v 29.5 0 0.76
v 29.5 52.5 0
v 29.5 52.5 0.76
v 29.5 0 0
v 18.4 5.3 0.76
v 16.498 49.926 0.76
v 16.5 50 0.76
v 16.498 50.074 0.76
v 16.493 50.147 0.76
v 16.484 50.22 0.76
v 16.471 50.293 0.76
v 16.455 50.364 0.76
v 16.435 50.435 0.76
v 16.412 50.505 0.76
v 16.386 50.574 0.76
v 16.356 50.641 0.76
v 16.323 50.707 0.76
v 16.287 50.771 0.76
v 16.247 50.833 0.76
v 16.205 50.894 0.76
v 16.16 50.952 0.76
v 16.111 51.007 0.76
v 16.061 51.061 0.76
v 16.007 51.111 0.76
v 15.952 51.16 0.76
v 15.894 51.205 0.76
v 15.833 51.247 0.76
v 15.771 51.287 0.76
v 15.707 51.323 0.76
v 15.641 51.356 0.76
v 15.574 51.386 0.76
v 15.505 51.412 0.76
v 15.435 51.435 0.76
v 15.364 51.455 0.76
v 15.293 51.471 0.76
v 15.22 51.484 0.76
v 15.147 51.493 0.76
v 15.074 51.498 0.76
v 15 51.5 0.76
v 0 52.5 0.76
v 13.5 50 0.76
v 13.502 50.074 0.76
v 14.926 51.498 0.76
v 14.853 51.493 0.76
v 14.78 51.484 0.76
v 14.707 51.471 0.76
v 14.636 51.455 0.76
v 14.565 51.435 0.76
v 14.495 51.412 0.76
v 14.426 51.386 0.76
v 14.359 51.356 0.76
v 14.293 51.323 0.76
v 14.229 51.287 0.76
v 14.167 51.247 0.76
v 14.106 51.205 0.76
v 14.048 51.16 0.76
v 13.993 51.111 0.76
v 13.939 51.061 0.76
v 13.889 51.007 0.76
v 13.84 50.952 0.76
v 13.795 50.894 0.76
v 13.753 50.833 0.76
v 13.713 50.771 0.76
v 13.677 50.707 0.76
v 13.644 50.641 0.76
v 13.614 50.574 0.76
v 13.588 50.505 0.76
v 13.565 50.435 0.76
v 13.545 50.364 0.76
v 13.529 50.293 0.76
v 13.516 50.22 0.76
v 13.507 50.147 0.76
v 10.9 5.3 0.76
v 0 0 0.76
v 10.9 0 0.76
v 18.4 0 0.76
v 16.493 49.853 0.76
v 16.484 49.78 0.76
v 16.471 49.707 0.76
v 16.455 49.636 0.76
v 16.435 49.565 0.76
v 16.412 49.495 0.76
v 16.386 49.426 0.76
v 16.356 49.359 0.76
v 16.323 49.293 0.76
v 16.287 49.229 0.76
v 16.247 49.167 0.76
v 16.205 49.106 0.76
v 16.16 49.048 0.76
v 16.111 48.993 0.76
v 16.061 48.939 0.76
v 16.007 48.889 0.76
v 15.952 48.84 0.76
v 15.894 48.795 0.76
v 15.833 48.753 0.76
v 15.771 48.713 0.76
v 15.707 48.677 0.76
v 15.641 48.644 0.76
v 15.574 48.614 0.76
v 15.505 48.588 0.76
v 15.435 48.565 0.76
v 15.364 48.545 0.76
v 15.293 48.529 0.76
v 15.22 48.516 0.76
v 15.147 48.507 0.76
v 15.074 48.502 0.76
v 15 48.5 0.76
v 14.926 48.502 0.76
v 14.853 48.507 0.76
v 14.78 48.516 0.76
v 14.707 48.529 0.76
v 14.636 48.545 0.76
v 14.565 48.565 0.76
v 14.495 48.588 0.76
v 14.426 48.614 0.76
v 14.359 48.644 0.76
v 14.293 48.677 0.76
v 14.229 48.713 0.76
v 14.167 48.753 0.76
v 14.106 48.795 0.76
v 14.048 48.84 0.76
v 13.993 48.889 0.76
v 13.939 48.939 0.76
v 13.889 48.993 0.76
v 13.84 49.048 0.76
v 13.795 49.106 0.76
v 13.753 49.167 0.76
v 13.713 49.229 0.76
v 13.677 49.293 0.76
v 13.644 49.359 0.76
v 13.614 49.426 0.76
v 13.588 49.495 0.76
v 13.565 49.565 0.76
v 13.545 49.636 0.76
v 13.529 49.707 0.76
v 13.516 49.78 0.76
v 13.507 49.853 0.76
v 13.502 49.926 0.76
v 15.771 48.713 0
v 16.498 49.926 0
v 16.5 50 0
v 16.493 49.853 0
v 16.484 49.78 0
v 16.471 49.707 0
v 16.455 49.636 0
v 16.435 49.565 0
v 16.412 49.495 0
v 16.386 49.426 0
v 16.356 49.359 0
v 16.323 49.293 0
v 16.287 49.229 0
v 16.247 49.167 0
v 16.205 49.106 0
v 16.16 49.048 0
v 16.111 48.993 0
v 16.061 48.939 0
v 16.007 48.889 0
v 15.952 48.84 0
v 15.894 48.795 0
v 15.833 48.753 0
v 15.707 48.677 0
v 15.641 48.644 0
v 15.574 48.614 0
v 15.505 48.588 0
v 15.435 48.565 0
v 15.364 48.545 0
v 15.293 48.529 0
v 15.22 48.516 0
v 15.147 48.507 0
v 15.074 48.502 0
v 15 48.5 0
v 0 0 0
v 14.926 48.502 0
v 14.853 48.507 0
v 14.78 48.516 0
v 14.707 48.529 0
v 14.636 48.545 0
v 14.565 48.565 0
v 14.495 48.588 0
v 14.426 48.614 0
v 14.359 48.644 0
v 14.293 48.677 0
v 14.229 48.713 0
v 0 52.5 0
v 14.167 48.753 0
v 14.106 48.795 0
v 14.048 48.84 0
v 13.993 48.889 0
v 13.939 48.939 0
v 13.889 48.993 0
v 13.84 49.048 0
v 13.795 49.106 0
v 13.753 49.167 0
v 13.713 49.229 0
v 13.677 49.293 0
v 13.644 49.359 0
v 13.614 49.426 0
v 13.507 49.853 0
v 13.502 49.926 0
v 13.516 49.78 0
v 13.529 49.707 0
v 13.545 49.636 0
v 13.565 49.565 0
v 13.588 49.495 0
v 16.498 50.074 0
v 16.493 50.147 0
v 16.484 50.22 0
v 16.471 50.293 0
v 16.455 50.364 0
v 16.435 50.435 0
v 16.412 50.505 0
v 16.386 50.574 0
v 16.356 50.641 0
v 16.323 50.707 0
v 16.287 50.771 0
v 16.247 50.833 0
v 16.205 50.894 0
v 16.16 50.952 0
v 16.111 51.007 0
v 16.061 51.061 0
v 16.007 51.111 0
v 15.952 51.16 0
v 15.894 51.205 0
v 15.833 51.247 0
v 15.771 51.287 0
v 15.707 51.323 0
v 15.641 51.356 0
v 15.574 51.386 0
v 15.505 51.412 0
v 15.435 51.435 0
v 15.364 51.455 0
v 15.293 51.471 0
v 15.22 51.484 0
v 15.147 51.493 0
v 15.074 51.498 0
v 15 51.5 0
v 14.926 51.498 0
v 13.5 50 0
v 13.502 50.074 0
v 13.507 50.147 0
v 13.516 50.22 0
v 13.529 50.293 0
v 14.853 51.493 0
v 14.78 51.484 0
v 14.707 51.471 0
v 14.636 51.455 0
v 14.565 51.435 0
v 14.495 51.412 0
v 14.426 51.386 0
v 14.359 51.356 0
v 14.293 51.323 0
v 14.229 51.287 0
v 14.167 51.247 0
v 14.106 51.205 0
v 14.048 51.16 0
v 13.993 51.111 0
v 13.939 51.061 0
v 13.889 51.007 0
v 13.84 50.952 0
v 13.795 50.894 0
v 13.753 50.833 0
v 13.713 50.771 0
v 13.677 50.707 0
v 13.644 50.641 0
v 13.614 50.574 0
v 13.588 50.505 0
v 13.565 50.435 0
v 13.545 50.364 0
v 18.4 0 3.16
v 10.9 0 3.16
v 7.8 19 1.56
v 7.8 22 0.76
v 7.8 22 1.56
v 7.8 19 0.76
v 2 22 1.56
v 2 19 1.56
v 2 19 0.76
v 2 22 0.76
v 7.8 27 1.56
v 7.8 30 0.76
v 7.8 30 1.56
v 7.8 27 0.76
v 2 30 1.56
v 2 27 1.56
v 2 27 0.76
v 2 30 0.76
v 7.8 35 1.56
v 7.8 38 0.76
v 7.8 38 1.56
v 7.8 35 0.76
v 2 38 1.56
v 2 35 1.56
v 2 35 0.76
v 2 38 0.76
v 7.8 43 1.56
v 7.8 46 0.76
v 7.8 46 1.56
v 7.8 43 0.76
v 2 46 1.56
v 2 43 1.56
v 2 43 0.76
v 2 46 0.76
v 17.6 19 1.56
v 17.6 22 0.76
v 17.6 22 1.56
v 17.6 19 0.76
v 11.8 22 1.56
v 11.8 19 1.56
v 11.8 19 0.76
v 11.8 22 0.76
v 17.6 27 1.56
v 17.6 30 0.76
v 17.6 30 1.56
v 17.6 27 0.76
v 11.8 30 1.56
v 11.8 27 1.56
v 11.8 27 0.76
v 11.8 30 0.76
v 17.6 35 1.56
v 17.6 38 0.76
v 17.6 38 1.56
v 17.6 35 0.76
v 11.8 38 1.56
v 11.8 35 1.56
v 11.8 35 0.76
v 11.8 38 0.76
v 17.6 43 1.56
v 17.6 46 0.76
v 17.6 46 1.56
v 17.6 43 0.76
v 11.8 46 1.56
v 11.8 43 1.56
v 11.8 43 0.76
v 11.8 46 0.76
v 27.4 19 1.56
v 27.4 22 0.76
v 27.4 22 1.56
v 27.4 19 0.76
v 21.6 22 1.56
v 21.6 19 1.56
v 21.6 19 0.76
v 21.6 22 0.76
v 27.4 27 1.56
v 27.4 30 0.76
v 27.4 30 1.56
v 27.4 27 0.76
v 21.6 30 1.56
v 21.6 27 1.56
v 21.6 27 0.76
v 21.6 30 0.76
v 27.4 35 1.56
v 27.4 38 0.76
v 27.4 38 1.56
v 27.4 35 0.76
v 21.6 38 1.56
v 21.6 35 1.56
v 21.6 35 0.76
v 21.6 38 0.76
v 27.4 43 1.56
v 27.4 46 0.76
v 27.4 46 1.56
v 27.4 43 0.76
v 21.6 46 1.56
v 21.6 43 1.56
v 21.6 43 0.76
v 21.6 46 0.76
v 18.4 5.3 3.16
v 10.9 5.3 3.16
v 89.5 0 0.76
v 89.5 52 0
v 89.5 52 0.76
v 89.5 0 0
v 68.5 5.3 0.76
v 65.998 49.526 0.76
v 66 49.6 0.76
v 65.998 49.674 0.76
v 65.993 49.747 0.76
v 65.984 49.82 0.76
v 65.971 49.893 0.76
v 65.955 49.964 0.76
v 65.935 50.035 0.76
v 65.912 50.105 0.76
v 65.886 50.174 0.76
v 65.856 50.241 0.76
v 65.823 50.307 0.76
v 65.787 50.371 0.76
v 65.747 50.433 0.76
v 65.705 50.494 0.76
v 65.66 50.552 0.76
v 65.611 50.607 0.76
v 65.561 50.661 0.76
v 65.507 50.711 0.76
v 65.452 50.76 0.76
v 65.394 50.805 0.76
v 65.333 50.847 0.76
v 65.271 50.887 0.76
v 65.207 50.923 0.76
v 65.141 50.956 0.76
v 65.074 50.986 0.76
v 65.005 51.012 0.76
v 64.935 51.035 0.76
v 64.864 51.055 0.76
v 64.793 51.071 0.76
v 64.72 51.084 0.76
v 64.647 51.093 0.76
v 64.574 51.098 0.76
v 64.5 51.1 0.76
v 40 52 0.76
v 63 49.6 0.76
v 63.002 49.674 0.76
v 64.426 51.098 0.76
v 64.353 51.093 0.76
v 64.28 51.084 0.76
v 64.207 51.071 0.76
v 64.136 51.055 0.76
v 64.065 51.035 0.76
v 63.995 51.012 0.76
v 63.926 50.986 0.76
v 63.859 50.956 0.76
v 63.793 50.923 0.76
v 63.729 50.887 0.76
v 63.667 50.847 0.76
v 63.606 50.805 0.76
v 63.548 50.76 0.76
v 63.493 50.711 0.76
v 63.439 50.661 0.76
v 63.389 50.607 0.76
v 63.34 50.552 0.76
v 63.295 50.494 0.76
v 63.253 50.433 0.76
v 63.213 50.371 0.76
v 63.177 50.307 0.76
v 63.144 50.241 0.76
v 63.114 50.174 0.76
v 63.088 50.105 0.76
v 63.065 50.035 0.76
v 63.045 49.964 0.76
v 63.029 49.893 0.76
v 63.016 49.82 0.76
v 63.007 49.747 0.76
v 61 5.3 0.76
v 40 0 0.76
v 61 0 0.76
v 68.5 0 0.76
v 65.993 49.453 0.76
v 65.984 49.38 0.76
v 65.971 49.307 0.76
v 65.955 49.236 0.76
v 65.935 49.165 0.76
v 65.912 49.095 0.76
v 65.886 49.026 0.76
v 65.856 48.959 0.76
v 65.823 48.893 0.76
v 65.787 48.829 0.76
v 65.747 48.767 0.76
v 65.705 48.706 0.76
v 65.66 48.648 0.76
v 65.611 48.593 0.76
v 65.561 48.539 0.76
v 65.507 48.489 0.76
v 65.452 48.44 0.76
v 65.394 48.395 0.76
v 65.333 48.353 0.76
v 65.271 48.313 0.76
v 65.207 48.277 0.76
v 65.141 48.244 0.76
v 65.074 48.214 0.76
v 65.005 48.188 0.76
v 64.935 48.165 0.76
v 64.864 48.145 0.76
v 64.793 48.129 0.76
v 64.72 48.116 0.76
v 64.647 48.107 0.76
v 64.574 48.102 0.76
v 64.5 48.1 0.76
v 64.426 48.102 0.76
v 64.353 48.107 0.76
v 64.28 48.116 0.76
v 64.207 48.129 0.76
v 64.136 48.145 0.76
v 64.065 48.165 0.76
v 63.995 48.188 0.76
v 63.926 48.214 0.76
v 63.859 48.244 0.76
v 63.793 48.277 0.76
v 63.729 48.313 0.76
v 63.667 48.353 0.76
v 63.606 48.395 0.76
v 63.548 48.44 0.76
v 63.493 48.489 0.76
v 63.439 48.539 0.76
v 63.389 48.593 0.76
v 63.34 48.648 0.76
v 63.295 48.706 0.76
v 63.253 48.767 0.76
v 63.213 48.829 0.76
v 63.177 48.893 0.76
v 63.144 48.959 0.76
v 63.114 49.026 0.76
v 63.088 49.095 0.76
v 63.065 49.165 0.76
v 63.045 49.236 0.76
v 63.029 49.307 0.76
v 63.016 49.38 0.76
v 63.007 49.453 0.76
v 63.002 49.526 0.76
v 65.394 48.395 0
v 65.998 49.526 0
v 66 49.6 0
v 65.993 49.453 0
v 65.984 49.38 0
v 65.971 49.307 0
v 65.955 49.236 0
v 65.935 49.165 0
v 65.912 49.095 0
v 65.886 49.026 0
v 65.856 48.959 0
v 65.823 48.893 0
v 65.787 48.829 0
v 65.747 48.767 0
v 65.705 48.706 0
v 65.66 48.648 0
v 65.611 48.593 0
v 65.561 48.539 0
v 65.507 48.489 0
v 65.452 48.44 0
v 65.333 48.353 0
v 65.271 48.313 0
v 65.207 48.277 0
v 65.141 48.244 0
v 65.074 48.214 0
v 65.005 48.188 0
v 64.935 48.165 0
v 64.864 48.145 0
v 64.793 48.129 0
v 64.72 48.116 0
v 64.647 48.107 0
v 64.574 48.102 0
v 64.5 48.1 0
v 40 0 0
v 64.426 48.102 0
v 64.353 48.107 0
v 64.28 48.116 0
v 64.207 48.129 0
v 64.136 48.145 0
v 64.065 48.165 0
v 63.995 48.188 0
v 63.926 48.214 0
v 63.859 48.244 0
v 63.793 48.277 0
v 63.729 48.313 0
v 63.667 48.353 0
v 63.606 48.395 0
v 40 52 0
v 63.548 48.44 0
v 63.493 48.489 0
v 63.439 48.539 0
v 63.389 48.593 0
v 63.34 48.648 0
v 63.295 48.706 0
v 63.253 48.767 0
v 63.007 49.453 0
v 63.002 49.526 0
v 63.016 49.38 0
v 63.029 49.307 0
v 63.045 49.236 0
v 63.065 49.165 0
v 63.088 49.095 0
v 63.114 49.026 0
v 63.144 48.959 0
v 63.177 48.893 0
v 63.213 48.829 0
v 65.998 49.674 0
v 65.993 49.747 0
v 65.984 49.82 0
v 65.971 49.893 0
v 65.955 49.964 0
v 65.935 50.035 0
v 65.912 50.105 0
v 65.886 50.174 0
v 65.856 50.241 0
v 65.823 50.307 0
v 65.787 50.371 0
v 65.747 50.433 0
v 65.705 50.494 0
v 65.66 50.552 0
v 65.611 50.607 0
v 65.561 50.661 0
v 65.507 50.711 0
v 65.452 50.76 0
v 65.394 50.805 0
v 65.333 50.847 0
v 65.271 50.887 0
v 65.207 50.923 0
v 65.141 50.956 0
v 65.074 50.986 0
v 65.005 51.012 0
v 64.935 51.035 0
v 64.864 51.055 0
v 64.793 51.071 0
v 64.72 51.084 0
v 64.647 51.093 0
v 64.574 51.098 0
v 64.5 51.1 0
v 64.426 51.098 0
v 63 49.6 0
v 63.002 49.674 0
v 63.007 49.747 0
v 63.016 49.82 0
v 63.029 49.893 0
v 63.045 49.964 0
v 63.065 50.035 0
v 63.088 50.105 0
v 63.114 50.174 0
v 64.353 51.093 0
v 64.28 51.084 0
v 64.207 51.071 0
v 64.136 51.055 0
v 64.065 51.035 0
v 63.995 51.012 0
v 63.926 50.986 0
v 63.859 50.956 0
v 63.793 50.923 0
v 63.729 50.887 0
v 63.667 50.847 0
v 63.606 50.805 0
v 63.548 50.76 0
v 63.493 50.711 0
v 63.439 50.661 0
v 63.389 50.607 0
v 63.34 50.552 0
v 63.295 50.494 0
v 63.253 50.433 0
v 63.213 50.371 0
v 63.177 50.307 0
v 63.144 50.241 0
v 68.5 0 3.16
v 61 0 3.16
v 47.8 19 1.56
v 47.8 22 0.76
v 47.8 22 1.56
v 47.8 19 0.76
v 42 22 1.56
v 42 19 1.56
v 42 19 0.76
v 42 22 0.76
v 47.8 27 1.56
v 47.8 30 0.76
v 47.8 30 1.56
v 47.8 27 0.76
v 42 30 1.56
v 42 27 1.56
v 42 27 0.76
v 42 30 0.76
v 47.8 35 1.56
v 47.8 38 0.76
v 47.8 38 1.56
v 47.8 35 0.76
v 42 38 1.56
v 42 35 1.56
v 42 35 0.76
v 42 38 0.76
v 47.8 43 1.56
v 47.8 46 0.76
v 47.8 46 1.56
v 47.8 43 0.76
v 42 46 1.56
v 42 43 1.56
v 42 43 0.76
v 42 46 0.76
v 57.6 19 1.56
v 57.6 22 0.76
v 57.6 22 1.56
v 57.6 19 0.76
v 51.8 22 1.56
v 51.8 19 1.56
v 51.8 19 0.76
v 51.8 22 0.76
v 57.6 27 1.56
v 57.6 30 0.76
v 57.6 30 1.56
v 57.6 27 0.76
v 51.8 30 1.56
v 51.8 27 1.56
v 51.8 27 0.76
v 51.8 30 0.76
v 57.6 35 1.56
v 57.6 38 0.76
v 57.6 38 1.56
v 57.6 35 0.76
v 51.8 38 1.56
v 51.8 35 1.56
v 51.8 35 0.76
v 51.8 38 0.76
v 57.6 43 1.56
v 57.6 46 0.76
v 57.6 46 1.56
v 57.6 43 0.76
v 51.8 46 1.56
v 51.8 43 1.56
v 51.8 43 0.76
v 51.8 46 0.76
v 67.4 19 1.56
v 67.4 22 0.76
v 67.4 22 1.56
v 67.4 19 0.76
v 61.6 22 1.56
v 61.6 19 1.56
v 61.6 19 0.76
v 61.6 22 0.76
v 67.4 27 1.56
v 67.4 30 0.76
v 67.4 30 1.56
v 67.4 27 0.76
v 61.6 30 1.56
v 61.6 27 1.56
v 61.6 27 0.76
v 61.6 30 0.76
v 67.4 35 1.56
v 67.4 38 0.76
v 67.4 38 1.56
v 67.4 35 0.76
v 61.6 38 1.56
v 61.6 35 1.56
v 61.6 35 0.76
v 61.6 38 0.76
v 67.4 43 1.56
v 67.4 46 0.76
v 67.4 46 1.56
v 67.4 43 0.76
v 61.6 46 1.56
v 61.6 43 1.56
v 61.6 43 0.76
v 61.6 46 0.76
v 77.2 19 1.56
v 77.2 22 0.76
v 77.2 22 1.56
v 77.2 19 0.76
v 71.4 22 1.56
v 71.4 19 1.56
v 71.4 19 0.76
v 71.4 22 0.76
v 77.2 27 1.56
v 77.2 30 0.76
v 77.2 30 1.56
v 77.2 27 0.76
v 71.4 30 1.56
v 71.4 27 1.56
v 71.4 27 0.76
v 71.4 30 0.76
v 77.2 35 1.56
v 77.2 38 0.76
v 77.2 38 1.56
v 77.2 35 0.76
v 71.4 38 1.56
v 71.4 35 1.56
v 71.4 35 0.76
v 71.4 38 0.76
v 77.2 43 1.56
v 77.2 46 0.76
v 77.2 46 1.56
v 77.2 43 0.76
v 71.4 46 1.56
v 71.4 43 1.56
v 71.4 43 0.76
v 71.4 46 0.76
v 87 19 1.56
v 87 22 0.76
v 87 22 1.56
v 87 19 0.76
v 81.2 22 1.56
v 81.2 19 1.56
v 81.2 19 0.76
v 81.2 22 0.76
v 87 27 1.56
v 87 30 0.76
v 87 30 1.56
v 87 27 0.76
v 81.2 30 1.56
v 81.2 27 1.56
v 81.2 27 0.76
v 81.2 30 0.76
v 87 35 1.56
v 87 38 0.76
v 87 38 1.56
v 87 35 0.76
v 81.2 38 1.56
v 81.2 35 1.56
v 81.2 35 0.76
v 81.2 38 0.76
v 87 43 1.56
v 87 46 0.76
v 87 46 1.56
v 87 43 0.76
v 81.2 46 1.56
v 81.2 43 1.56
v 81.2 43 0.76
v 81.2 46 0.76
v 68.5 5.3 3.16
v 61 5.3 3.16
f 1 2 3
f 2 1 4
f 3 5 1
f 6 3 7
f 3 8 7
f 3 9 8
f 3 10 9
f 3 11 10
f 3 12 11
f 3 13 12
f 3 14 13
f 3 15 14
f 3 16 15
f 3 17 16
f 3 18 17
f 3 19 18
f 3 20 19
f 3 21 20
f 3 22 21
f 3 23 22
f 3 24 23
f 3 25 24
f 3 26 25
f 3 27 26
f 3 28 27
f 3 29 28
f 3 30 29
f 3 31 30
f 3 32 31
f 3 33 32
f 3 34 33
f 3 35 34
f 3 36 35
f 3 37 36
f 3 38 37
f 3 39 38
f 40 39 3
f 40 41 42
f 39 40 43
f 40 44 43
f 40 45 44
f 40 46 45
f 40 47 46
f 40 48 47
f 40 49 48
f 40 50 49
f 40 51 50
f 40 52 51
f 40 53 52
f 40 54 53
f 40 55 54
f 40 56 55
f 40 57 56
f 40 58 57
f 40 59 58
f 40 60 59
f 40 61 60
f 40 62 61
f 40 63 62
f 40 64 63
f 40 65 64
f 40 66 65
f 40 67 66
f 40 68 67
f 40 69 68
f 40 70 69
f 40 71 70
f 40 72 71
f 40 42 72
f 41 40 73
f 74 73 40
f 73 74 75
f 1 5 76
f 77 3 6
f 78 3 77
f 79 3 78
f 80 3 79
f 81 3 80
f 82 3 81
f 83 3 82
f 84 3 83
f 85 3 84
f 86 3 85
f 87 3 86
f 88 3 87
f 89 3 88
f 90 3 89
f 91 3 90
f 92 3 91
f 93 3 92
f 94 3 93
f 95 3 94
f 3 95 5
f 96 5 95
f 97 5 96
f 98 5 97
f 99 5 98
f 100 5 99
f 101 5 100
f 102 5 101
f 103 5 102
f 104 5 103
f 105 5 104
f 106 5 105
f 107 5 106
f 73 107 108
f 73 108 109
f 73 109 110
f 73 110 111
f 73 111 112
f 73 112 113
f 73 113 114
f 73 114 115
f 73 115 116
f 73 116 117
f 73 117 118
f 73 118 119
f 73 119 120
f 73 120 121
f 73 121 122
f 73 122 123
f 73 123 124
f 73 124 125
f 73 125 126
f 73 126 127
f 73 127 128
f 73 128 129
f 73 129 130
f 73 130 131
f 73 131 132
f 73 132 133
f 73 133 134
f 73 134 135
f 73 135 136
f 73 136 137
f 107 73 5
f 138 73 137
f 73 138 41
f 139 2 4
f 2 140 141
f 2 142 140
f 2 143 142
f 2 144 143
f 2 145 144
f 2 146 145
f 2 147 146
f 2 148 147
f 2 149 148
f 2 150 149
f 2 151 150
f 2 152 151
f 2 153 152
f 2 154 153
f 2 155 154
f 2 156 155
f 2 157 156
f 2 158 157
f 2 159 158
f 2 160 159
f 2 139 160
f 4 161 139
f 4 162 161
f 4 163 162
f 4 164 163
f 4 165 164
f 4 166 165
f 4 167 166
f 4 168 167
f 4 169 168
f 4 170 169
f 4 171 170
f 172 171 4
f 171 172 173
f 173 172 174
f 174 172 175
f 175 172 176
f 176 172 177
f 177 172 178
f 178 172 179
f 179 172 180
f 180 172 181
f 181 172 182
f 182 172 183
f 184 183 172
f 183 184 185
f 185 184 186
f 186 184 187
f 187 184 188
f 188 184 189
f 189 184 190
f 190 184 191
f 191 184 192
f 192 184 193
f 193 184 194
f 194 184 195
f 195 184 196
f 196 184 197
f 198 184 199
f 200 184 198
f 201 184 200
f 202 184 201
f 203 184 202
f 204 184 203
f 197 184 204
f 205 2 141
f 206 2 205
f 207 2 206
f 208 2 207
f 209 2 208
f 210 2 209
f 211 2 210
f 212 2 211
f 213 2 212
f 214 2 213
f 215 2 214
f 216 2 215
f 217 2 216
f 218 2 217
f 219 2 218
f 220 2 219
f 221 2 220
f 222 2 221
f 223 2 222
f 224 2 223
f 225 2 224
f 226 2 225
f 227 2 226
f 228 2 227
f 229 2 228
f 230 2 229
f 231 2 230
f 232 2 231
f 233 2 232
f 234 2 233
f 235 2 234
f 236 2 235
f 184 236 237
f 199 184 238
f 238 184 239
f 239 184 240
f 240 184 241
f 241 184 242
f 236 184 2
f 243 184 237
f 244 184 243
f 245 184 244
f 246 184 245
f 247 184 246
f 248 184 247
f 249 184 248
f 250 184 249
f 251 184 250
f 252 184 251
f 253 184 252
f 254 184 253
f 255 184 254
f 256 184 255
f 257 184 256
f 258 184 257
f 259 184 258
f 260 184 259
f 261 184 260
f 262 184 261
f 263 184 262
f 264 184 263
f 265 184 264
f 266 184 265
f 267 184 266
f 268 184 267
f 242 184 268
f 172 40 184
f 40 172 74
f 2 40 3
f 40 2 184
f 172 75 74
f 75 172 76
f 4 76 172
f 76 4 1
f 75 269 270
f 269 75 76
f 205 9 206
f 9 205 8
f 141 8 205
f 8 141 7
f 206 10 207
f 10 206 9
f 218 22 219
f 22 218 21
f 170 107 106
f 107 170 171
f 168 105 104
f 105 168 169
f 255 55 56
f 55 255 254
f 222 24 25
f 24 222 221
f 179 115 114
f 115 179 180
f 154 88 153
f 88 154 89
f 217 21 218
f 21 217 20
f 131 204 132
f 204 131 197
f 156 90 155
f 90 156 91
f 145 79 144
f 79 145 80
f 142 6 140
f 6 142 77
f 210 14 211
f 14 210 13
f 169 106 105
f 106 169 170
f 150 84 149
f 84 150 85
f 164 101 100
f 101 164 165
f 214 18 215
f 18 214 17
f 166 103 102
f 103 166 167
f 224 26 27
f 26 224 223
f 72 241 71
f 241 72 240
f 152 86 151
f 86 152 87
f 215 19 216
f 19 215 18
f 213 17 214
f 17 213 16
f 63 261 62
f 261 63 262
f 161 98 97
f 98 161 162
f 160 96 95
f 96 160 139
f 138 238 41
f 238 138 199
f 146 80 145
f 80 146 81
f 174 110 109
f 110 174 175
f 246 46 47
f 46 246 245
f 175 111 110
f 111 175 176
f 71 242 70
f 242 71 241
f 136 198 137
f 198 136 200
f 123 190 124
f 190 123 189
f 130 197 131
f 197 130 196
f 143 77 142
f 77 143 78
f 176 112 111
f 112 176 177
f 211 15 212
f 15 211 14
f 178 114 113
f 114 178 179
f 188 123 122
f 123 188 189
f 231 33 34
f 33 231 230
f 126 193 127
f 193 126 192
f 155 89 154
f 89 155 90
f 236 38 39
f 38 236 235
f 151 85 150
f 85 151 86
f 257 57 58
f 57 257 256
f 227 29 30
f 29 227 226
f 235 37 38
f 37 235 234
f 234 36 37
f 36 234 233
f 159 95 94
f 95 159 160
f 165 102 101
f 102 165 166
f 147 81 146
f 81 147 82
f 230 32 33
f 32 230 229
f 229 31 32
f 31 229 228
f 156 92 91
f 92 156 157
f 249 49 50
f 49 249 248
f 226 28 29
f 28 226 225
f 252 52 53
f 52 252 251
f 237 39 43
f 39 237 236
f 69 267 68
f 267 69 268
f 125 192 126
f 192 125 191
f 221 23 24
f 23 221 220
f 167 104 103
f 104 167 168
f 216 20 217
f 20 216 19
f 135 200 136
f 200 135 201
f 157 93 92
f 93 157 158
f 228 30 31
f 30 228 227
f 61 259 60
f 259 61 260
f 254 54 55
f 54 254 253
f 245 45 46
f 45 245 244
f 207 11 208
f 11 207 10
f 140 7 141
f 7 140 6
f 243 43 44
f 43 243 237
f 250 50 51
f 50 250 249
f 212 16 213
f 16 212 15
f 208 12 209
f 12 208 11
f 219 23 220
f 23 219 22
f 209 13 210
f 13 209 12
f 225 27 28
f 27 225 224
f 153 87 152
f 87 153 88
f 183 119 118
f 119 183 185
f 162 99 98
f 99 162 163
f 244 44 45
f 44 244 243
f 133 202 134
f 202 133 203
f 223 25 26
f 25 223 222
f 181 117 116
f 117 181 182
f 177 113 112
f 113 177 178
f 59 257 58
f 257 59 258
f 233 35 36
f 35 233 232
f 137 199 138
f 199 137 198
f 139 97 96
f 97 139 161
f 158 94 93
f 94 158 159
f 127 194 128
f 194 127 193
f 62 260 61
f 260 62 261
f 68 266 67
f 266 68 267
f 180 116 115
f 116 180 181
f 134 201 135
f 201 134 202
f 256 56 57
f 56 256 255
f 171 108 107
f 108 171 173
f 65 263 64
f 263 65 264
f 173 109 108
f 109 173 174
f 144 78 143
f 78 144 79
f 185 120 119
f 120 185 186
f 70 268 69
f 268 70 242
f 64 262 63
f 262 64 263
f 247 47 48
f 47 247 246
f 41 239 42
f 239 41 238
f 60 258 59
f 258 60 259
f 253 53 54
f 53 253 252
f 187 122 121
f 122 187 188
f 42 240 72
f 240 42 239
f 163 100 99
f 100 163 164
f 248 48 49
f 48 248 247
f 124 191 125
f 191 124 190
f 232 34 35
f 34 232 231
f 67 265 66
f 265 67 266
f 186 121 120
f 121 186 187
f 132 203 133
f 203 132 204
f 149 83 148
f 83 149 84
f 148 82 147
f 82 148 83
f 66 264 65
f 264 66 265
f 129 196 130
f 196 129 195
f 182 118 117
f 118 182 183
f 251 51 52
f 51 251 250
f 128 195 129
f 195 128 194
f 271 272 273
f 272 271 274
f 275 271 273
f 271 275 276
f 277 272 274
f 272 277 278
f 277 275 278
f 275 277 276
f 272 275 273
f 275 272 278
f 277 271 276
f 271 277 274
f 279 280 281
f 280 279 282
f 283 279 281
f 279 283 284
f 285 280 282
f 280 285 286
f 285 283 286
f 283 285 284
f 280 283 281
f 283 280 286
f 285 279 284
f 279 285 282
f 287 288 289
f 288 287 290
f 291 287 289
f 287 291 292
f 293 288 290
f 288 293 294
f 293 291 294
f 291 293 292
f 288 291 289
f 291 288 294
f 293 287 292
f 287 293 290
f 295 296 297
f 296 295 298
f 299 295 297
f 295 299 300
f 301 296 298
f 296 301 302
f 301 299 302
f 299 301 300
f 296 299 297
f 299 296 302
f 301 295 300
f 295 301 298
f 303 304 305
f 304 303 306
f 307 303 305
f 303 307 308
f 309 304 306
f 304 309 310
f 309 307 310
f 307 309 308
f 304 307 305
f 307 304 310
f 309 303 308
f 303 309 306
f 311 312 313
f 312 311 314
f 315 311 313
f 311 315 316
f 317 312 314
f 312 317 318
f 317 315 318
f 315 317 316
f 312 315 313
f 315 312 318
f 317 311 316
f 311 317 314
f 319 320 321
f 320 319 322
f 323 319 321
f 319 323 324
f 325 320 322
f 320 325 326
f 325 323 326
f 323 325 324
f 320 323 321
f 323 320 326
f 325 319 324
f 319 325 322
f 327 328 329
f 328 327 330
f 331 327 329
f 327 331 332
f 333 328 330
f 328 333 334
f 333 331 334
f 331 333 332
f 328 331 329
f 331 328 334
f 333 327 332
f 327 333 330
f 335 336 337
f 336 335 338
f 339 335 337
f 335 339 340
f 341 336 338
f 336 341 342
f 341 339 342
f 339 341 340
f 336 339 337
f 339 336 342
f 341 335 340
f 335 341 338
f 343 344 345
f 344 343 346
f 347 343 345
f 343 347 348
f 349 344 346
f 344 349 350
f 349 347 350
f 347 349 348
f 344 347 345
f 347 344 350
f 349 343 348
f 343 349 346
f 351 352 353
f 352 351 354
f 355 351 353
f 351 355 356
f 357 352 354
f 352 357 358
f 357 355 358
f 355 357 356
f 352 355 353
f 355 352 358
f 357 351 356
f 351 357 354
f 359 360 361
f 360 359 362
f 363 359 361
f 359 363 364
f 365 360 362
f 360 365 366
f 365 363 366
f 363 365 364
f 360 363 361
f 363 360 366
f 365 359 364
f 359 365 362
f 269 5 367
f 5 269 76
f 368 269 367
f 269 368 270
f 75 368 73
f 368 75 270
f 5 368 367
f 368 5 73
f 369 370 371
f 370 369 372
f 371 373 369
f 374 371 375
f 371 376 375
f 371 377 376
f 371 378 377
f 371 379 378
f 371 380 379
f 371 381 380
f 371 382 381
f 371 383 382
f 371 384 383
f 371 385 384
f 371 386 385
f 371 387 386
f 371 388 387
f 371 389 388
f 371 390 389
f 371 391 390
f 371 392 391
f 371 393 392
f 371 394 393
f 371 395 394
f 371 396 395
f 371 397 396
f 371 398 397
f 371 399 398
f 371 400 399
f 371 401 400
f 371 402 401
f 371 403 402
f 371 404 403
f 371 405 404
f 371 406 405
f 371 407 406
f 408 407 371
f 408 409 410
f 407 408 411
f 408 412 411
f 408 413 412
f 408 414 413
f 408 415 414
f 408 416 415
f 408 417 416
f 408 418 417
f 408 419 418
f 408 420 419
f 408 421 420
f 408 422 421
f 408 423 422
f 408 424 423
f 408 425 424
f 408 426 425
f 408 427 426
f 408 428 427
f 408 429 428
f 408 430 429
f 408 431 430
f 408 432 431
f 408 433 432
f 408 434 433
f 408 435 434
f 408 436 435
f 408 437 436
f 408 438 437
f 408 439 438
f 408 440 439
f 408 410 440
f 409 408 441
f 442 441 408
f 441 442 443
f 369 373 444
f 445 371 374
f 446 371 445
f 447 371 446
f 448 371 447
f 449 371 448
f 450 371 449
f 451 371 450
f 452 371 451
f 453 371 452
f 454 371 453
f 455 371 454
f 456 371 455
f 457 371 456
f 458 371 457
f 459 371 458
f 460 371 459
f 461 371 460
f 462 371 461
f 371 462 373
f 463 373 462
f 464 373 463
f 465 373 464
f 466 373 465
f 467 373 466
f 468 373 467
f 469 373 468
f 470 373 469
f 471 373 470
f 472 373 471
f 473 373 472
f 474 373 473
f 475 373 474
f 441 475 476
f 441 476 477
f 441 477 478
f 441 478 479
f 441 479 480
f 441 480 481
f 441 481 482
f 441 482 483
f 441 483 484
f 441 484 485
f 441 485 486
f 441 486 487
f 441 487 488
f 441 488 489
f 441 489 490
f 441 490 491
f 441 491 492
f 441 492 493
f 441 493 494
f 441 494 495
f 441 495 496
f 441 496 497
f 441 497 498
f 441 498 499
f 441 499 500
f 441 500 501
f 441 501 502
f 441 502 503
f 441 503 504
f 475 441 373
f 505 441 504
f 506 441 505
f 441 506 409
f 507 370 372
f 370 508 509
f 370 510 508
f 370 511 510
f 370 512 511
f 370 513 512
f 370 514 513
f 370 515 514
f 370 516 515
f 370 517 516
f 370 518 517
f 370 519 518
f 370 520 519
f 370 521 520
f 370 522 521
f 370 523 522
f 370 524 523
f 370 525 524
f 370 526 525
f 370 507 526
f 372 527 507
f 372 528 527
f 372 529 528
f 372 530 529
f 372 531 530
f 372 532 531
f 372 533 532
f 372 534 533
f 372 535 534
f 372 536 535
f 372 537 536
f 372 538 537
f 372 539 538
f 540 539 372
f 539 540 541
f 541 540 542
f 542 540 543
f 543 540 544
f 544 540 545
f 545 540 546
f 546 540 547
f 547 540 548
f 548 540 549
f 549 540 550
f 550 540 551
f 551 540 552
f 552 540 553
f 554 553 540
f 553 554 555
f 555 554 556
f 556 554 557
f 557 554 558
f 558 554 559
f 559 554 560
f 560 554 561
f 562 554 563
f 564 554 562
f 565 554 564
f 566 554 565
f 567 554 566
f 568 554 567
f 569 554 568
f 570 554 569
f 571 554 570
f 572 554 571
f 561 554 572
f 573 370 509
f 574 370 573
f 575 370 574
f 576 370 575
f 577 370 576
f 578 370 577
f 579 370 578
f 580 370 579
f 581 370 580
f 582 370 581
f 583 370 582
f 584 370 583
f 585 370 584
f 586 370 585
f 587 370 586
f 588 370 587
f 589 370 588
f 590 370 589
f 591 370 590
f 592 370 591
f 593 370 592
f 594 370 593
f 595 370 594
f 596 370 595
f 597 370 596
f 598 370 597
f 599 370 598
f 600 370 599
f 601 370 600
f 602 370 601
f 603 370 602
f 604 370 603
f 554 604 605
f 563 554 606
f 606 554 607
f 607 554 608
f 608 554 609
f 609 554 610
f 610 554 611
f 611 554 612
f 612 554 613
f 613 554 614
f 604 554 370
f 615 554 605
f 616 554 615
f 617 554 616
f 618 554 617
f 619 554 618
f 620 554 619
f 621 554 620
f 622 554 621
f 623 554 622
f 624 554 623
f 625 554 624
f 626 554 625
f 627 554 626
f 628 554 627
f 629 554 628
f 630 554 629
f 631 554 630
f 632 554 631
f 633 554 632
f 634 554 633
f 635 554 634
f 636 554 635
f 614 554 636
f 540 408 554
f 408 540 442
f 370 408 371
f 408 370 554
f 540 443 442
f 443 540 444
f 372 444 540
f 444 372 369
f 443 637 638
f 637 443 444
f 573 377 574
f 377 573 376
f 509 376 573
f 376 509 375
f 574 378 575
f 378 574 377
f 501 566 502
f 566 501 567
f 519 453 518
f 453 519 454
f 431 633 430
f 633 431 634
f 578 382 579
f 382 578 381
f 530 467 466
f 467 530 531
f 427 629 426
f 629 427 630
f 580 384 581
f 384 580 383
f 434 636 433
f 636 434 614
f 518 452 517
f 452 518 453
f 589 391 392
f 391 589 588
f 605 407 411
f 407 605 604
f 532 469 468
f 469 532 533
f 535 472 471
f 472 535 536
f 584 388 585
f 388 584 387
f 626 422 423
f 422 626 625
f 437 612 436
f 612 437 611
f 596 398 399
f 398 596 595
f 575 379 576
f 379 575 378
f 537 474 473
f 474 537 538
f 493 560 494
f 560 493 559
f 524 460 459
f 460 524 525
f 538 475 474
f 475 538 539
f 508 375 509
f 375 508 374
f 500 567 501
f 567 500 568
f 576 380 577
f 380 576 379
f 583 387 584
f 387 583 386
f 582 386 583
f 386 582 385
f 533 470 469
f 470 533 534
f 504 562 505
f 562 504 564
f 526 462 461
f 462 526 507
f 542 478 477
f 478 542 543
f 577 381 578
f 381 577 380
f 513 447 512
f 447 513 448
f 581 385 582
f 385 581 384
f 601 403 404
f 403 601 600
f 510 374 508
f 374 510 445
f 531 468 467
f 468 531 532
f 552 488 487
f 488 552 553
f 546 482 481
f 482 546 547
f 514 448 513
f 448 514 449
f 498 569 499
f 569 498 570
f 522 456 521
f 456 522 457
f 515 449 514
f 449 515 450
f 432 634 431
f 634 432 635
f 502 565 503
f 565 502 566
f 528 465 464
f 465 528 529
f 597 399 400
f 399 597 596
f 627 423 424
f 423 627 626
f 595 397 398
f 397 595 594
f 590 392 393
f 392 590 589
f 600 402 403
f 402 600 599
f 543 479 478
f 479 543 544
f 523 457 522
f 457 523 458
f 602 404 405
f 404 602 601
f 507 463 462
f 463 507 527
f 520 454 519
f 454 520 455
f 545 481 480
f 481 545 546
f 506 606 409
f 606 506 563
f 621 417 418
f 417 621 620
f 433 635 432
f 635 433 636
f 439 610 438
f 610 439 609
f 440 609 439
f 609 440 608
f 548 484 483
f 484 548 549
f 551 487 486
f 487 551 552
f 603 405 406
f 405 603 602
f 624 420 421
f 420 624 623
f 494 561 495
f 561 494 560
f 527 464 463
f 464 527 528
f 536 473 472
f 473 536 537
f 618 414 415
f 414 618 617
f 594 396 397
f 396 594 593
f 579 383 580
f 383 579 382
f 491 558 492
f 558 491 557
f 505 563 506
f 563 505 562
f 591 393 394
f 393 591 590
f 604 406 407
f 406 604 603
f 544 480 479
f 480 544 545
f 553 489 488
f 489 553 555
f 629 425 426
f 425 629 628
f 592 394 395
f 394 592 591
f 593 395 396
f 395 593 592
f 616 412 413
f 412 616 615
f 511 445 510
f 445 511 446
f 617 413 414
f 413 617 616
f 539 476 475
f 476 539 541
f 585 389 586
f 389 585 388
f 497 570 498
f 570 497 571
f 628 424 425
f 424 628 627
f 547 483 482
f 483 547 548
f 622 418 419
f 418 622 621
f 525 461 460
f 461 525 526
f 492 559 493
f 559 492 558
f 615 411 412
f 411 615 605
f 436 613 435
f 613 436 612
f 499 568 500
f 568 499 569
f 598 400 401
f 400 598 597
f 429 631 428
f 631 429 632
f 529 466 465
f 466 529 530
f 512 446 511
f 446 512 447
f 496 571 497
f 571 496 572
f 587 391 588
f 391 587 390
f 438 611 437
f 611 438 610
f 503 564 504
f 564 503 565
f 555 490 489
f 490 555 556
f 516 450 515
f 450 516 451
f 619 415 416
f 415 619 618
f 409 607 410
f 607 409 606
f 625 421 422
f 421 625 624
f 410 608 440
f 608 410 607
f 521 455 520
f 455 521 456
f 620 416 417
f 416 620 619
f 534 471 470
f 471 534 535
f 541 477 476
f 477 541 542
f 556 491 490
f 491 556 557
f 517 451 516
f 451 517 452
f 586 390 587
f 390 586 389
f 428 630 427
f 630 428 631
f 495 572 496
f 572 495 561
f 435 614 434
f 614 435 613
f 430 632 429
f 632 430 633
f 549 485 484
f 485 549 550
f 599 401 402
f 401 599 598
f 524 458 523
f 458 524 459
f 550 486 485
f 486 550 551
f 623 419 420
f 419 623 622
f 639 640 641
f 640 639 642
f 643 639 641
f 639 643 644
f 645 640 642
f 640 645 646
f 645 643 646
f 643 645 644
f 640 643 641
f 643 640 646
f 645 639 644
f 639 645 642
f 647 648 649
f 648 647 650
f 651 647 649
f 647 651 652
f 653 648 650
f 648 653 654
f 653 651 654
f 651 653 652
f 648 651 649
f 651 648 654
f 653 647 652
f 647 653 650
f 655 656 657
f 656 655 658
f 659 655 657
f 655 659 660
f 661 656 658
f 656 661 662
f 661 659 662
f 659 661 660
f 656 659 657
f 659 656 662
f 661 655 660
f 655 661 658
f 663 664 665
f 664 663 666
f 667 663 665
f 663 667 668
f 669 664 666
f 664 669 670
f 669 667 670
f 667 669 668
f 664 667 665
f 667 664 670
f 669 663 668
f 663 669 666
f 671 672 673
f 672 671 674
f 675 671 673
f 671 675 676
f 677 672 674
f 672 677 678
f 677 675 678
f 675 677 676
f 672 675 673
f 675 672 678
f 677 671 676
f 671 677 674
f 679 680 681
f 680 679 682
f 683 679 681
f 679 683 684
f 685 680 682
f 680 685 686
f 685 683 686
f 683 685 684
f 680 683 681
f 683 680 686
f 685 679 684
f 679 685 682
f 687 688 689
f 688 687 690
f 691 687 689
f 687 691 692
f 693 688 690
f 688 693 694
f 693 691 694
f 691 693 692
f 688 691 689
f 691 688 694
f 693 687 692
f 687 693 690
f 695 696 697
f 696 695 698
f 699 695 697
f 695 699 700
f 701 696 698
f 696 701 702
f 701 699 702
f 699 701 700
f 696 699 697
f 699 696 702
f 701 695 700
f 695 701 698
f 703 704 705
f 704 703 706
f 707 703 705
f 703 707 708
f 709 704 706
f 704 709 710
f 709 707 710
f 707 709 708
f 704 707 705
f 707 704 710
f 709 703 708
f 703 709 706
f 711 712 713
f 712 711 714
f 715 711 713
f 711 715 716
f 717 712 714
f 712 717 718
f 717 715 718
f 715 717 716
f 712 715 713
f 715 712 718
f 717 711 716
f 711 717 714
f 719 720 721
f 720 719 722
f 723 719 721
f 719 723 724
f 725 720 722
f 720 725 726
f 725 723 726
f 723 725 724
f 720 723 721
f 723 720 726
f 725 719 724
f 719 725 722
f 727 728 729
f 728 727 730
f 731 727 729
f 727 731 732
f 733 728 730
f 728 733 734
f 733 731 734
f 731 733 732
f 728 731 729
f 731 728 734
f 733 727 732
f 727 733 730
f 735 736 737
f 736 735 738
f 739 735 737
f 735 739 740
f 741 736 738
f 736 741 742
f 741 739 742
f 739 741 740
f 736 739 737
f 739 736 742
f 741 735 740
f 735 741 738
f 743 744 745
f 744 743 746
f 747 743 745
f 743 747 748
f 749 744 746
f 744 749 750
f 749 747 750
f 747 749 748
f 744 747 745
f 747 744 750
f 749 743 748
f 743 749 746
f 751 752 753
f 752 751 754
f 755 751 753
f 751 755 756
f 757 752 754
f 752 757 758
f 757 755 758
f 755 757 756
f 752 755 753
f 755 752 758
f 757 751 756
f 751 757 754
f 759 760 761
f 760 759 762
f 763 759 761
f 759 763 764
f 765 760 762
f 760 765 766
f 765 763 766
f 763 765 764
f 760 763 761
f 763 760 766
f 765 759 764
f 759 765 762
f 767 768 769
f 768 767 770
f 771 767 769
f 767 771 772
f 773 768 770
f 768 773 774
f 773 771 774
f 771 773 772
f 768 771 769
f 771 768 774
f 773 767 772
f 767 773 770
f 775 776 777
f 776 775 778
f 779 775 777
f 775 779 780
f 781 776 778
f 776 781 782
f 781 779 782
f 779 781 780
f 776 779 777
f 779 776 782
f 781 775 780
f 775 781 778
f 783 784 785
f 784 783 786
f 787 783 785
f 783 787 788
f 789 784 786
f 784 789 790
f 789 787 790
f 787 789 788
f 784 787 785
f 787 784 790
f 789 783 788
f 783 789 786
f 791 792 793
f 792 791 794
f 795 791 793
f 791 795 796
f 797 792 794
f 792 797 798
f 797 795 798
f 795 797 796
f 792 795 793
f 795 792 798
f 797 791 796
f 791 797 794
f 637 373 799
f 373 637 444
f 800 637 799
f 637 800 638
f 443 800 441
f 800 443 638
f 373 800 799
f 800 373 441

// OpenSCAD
// file: ../lib/common.scad
/* A library of common modules, functions and variables
 * used by other *.scad files in this repository
 * by Mikrotron d.o.o. 2022
 * see the project root for license
 */
 
 /****************************************************************************
  ****************************** Variables ***********************************
  ****************************************************************************/

// Extra dimension to remove wall ambiguity in preview mode, too small to make
// any difference in 3D print, but you can set it to 0 if it bothers you ;-)
ex = 0.001;

// Make rounded objects smoother, if it slows down rendering, decrease the value.
// This is a general case value, it might be overridden for some objects and
// changing this value will have no effect for these objects
$fn = 128;

// Hole dimension correction - if 3D printed holes turn out too small,
// increase the value, or decrease the value if they're too big
// Default value is 0.4 mm
hdc = 0.4;

// Some common nuts and bolts dimensions, first number is bolt diameter
// and the second one is metric nut size (wrench size). To get value for
// specific bolts and nuts use functions bolt_dia() and nut2radius(),
// passing nuts_bolts index as parameter. If you need extra values, do
// not insert them, add them to the end of list or you'll corrupt 
// existing models
nuts_bolts = [ [1.6, 3.2],  // M1.6, index = 0
               [2, 4],      // M2,   index = 1
               [2.5, 5],    // M2.5, index = 2
               [3, 5.5],    // M3,   index = 3
               [4, 7],      // M4,   index = 4
               [5, 8],      // M5,   index = 5
               [6, 10],     // M6,   index = 6
               [8, 13],     // M8,   index = 7
               [10, 16] ];  // M10,  index = 8

// Set to true to see some example models, default is false
test = false;
if (test) test_draw();

/****************************************************************************
 ******************************* Modules ************************************
 ****************************************************************************/

// Set test variable to 'true' to see examples
module test_draw() {
    offset = 10;
    // Metric nuts
    for (i = [0 : len(nuts_bolts) - 1]) {
        translate([0, i*nut2dia(i), 0]) difference() {
            cylinder(d = nut2dia(i), h = bolt2dia(i), $fn = 6);
            translate(zex()) cylinder(d = bolt2dia(i), h = bolt2dia(i) + 2*ex);
        }
    }
    // Rounded rectangle
    translate([3*offset, 0, 0]) rounded_rect(5*offset, 3*offset, 5, 3);
    // Quarter of a cylinder
    translate([3*offset, 5*offset, 0]) cylinder_quarter(offset, 2*offset);
    // Cross beams
    translate([3*offset, 8*offset, 0]) cross_beams(3*offset, 5*offset, offset/4);
}

// Draws a rounded rectangle
module rounded_rect(x, y, z, radius = 1) {
    translate([radius,radius,0]) //move origin to outer limits
	linear_extrude(height=z)
		minkowski() {
			square([x-2*radius,y-2*radius]); //keep outer dimensions given by x and y
			circle(r = radius);
		}
}

// Draws quarter of a cylinder
module cylinder_quarter(r, h){    
    difference(){
        cylinder(r=r, h=h);
        translate ([-r-ex, -r-ex, -ex]) cube([2*r + 2*ex, r + ex, h + 2*ex]);
        translate ([-r-ex, -ex, -ex]) cube([r + ex, r + ex, h + 2*ex]);
    }
}

// Draws cross beams in the ractangle with sides a and b,
// used to shorten the print time
module cross_beams(rect_a, rect_b, beam_width){
    diag = sqrt(rect_a*rect_a + rect_b*rect_b);
    rot = atan2(rect_b, rect_a);
    translate([rect_a/2, rect_b/2, beam_width/2])
    difference(){
        union(){
            rotate(rot) cube([diag, beam_width, beam_width], true);
            rotate(-rot) cube([diag, beam_width, beam_width], true);
        }
        difference(){
            cube([rect_a + 2*beam_width, rect_b + 2*beam_width, beam_width + 2*ex], true);
            cube([rect_a, rect_b, beam_width + 4*ex], true);
        }
    }
}

/****************************************************************************
 ****************************** Functions ***********************************
 ****************************************************************************/
  
// Calculates nut diameter for given bolt_nuts index,
// check bolts_nuts list for index reference
function nut2dia(index) = nuts_bolts[index][1]/cos(180/6) + hdc/2;

// Calculates bolt diameter for given bolt_nuts index,
// check bolts_nuts list for index reference
function bolt2dia(index) = nuts_bolts[index][0] + hdc/2;

// Move to -ex on z axis
function zex() = [0, 0, -ex];
// main file
/*
 * This file is part of Lightbox project
 * (https://github.com/mikrotron-zg/3dprint-models/tree/main/lightbox)
 * developed by Mikrotron d.o.o. (http://mikrotron.hr).
 * It contains LED board mockups used for this project.
 *
 * This program is free software: you can redistribute it and/or modify
 * it under the terms of the GNU General Public License as published by
 * the Free Software Foundation, either version 3 of the License, or
 * (at your option) any later version. See the LICENSE file at the 
 * top-level directory of this distribution for details 
 *
 * This program is distributed in the hope that it will be useful,
 * but WITHOUT ANY WARRANTY; without even the implied warranty of
 * MERCHANTABILITY or FITNESS FOR A PARTICULAR PURPOSE.  See the
 * GNU General Public License for more details.
 *
 * You should have received a copy of the GNU General Public License
 * along with this program.  If not, see <https://www.gnu.org/licenses/>.
 */
 
// Use common library
include <../lib/common.scad>;
 
// Global variables
mh_dia = 3; // mount hole diameter
 
// Uncomment this to show board mockups
show_boards();
 
module show_boards() {
    board_3x4();
    translate([40, 0, 0]) board_5x4();
}
 
module board_3x4() {
    board = [29.5, 52.5, 0.76]; // board dimensions
    mh_position = [15.0, 50.0, -ex]; // mount hole position
    usb_position = [10.9, 0, 0.76]; // micro USB connector position
    led_matrix_origin = [2, 19, 0.76]; // LED matrix origin point
    led_matrix_size = [3, 4]; // LED matrix dimensions
    draw_board(board, mh_position, usb_position, led_matrix_origin, led_matrix_size);
}
 
module board_5x4() {
    board = [49.5, 52.0, 0.76]; // board dimensions
    mh_position = [24.5, 49.6, -ex]; // mount hole position
    usb_position = [21, 0, 0.76]; // micro USB connector position
    led_matrix_origin = [2, 19, 0.76]; // LED matrix origin point
    led_matrix_size = [5, 4]; // LED matrix dimensions
    draw_board(board, mh_position, usb_position, led_matrix_origin, led_matrix_size);
}
 
module draw_board(board, mh_position, usb_position, led_matrix_origin, led_matrix_size) {
    difference() {
        cube(board);
        translate(mh_position) cylinder(d = mh_dia, h = board[2] + 2*ex);
    }
    translate(usb_position) usb_connector();
    translate(led_matrix_origin) led_matrix(led_matrix_size);
}

module usb_connector() {
    connector = [7.5, 5.3, 2.4]; // micro USB connector dimensions
    color("Gray") cube(connector);
}

module led_matrix(matrix_size) {
    led = [5.8, 3.0, 0.8]; // LED dimensions
    x_spacing = led[0] + 4.0;
    y_spacing = led[1] + 5.0;
    for (x = [0 : matrix_size[0] - 1]) {
        translate([x*x_spacing, 0, 0]) {
            for (y = [0 : matrix_size[1] - 1]) {
                translate([0, y*y_spacing, 0]) color("Yellow") cube(led);
            }
        }
    }
}
